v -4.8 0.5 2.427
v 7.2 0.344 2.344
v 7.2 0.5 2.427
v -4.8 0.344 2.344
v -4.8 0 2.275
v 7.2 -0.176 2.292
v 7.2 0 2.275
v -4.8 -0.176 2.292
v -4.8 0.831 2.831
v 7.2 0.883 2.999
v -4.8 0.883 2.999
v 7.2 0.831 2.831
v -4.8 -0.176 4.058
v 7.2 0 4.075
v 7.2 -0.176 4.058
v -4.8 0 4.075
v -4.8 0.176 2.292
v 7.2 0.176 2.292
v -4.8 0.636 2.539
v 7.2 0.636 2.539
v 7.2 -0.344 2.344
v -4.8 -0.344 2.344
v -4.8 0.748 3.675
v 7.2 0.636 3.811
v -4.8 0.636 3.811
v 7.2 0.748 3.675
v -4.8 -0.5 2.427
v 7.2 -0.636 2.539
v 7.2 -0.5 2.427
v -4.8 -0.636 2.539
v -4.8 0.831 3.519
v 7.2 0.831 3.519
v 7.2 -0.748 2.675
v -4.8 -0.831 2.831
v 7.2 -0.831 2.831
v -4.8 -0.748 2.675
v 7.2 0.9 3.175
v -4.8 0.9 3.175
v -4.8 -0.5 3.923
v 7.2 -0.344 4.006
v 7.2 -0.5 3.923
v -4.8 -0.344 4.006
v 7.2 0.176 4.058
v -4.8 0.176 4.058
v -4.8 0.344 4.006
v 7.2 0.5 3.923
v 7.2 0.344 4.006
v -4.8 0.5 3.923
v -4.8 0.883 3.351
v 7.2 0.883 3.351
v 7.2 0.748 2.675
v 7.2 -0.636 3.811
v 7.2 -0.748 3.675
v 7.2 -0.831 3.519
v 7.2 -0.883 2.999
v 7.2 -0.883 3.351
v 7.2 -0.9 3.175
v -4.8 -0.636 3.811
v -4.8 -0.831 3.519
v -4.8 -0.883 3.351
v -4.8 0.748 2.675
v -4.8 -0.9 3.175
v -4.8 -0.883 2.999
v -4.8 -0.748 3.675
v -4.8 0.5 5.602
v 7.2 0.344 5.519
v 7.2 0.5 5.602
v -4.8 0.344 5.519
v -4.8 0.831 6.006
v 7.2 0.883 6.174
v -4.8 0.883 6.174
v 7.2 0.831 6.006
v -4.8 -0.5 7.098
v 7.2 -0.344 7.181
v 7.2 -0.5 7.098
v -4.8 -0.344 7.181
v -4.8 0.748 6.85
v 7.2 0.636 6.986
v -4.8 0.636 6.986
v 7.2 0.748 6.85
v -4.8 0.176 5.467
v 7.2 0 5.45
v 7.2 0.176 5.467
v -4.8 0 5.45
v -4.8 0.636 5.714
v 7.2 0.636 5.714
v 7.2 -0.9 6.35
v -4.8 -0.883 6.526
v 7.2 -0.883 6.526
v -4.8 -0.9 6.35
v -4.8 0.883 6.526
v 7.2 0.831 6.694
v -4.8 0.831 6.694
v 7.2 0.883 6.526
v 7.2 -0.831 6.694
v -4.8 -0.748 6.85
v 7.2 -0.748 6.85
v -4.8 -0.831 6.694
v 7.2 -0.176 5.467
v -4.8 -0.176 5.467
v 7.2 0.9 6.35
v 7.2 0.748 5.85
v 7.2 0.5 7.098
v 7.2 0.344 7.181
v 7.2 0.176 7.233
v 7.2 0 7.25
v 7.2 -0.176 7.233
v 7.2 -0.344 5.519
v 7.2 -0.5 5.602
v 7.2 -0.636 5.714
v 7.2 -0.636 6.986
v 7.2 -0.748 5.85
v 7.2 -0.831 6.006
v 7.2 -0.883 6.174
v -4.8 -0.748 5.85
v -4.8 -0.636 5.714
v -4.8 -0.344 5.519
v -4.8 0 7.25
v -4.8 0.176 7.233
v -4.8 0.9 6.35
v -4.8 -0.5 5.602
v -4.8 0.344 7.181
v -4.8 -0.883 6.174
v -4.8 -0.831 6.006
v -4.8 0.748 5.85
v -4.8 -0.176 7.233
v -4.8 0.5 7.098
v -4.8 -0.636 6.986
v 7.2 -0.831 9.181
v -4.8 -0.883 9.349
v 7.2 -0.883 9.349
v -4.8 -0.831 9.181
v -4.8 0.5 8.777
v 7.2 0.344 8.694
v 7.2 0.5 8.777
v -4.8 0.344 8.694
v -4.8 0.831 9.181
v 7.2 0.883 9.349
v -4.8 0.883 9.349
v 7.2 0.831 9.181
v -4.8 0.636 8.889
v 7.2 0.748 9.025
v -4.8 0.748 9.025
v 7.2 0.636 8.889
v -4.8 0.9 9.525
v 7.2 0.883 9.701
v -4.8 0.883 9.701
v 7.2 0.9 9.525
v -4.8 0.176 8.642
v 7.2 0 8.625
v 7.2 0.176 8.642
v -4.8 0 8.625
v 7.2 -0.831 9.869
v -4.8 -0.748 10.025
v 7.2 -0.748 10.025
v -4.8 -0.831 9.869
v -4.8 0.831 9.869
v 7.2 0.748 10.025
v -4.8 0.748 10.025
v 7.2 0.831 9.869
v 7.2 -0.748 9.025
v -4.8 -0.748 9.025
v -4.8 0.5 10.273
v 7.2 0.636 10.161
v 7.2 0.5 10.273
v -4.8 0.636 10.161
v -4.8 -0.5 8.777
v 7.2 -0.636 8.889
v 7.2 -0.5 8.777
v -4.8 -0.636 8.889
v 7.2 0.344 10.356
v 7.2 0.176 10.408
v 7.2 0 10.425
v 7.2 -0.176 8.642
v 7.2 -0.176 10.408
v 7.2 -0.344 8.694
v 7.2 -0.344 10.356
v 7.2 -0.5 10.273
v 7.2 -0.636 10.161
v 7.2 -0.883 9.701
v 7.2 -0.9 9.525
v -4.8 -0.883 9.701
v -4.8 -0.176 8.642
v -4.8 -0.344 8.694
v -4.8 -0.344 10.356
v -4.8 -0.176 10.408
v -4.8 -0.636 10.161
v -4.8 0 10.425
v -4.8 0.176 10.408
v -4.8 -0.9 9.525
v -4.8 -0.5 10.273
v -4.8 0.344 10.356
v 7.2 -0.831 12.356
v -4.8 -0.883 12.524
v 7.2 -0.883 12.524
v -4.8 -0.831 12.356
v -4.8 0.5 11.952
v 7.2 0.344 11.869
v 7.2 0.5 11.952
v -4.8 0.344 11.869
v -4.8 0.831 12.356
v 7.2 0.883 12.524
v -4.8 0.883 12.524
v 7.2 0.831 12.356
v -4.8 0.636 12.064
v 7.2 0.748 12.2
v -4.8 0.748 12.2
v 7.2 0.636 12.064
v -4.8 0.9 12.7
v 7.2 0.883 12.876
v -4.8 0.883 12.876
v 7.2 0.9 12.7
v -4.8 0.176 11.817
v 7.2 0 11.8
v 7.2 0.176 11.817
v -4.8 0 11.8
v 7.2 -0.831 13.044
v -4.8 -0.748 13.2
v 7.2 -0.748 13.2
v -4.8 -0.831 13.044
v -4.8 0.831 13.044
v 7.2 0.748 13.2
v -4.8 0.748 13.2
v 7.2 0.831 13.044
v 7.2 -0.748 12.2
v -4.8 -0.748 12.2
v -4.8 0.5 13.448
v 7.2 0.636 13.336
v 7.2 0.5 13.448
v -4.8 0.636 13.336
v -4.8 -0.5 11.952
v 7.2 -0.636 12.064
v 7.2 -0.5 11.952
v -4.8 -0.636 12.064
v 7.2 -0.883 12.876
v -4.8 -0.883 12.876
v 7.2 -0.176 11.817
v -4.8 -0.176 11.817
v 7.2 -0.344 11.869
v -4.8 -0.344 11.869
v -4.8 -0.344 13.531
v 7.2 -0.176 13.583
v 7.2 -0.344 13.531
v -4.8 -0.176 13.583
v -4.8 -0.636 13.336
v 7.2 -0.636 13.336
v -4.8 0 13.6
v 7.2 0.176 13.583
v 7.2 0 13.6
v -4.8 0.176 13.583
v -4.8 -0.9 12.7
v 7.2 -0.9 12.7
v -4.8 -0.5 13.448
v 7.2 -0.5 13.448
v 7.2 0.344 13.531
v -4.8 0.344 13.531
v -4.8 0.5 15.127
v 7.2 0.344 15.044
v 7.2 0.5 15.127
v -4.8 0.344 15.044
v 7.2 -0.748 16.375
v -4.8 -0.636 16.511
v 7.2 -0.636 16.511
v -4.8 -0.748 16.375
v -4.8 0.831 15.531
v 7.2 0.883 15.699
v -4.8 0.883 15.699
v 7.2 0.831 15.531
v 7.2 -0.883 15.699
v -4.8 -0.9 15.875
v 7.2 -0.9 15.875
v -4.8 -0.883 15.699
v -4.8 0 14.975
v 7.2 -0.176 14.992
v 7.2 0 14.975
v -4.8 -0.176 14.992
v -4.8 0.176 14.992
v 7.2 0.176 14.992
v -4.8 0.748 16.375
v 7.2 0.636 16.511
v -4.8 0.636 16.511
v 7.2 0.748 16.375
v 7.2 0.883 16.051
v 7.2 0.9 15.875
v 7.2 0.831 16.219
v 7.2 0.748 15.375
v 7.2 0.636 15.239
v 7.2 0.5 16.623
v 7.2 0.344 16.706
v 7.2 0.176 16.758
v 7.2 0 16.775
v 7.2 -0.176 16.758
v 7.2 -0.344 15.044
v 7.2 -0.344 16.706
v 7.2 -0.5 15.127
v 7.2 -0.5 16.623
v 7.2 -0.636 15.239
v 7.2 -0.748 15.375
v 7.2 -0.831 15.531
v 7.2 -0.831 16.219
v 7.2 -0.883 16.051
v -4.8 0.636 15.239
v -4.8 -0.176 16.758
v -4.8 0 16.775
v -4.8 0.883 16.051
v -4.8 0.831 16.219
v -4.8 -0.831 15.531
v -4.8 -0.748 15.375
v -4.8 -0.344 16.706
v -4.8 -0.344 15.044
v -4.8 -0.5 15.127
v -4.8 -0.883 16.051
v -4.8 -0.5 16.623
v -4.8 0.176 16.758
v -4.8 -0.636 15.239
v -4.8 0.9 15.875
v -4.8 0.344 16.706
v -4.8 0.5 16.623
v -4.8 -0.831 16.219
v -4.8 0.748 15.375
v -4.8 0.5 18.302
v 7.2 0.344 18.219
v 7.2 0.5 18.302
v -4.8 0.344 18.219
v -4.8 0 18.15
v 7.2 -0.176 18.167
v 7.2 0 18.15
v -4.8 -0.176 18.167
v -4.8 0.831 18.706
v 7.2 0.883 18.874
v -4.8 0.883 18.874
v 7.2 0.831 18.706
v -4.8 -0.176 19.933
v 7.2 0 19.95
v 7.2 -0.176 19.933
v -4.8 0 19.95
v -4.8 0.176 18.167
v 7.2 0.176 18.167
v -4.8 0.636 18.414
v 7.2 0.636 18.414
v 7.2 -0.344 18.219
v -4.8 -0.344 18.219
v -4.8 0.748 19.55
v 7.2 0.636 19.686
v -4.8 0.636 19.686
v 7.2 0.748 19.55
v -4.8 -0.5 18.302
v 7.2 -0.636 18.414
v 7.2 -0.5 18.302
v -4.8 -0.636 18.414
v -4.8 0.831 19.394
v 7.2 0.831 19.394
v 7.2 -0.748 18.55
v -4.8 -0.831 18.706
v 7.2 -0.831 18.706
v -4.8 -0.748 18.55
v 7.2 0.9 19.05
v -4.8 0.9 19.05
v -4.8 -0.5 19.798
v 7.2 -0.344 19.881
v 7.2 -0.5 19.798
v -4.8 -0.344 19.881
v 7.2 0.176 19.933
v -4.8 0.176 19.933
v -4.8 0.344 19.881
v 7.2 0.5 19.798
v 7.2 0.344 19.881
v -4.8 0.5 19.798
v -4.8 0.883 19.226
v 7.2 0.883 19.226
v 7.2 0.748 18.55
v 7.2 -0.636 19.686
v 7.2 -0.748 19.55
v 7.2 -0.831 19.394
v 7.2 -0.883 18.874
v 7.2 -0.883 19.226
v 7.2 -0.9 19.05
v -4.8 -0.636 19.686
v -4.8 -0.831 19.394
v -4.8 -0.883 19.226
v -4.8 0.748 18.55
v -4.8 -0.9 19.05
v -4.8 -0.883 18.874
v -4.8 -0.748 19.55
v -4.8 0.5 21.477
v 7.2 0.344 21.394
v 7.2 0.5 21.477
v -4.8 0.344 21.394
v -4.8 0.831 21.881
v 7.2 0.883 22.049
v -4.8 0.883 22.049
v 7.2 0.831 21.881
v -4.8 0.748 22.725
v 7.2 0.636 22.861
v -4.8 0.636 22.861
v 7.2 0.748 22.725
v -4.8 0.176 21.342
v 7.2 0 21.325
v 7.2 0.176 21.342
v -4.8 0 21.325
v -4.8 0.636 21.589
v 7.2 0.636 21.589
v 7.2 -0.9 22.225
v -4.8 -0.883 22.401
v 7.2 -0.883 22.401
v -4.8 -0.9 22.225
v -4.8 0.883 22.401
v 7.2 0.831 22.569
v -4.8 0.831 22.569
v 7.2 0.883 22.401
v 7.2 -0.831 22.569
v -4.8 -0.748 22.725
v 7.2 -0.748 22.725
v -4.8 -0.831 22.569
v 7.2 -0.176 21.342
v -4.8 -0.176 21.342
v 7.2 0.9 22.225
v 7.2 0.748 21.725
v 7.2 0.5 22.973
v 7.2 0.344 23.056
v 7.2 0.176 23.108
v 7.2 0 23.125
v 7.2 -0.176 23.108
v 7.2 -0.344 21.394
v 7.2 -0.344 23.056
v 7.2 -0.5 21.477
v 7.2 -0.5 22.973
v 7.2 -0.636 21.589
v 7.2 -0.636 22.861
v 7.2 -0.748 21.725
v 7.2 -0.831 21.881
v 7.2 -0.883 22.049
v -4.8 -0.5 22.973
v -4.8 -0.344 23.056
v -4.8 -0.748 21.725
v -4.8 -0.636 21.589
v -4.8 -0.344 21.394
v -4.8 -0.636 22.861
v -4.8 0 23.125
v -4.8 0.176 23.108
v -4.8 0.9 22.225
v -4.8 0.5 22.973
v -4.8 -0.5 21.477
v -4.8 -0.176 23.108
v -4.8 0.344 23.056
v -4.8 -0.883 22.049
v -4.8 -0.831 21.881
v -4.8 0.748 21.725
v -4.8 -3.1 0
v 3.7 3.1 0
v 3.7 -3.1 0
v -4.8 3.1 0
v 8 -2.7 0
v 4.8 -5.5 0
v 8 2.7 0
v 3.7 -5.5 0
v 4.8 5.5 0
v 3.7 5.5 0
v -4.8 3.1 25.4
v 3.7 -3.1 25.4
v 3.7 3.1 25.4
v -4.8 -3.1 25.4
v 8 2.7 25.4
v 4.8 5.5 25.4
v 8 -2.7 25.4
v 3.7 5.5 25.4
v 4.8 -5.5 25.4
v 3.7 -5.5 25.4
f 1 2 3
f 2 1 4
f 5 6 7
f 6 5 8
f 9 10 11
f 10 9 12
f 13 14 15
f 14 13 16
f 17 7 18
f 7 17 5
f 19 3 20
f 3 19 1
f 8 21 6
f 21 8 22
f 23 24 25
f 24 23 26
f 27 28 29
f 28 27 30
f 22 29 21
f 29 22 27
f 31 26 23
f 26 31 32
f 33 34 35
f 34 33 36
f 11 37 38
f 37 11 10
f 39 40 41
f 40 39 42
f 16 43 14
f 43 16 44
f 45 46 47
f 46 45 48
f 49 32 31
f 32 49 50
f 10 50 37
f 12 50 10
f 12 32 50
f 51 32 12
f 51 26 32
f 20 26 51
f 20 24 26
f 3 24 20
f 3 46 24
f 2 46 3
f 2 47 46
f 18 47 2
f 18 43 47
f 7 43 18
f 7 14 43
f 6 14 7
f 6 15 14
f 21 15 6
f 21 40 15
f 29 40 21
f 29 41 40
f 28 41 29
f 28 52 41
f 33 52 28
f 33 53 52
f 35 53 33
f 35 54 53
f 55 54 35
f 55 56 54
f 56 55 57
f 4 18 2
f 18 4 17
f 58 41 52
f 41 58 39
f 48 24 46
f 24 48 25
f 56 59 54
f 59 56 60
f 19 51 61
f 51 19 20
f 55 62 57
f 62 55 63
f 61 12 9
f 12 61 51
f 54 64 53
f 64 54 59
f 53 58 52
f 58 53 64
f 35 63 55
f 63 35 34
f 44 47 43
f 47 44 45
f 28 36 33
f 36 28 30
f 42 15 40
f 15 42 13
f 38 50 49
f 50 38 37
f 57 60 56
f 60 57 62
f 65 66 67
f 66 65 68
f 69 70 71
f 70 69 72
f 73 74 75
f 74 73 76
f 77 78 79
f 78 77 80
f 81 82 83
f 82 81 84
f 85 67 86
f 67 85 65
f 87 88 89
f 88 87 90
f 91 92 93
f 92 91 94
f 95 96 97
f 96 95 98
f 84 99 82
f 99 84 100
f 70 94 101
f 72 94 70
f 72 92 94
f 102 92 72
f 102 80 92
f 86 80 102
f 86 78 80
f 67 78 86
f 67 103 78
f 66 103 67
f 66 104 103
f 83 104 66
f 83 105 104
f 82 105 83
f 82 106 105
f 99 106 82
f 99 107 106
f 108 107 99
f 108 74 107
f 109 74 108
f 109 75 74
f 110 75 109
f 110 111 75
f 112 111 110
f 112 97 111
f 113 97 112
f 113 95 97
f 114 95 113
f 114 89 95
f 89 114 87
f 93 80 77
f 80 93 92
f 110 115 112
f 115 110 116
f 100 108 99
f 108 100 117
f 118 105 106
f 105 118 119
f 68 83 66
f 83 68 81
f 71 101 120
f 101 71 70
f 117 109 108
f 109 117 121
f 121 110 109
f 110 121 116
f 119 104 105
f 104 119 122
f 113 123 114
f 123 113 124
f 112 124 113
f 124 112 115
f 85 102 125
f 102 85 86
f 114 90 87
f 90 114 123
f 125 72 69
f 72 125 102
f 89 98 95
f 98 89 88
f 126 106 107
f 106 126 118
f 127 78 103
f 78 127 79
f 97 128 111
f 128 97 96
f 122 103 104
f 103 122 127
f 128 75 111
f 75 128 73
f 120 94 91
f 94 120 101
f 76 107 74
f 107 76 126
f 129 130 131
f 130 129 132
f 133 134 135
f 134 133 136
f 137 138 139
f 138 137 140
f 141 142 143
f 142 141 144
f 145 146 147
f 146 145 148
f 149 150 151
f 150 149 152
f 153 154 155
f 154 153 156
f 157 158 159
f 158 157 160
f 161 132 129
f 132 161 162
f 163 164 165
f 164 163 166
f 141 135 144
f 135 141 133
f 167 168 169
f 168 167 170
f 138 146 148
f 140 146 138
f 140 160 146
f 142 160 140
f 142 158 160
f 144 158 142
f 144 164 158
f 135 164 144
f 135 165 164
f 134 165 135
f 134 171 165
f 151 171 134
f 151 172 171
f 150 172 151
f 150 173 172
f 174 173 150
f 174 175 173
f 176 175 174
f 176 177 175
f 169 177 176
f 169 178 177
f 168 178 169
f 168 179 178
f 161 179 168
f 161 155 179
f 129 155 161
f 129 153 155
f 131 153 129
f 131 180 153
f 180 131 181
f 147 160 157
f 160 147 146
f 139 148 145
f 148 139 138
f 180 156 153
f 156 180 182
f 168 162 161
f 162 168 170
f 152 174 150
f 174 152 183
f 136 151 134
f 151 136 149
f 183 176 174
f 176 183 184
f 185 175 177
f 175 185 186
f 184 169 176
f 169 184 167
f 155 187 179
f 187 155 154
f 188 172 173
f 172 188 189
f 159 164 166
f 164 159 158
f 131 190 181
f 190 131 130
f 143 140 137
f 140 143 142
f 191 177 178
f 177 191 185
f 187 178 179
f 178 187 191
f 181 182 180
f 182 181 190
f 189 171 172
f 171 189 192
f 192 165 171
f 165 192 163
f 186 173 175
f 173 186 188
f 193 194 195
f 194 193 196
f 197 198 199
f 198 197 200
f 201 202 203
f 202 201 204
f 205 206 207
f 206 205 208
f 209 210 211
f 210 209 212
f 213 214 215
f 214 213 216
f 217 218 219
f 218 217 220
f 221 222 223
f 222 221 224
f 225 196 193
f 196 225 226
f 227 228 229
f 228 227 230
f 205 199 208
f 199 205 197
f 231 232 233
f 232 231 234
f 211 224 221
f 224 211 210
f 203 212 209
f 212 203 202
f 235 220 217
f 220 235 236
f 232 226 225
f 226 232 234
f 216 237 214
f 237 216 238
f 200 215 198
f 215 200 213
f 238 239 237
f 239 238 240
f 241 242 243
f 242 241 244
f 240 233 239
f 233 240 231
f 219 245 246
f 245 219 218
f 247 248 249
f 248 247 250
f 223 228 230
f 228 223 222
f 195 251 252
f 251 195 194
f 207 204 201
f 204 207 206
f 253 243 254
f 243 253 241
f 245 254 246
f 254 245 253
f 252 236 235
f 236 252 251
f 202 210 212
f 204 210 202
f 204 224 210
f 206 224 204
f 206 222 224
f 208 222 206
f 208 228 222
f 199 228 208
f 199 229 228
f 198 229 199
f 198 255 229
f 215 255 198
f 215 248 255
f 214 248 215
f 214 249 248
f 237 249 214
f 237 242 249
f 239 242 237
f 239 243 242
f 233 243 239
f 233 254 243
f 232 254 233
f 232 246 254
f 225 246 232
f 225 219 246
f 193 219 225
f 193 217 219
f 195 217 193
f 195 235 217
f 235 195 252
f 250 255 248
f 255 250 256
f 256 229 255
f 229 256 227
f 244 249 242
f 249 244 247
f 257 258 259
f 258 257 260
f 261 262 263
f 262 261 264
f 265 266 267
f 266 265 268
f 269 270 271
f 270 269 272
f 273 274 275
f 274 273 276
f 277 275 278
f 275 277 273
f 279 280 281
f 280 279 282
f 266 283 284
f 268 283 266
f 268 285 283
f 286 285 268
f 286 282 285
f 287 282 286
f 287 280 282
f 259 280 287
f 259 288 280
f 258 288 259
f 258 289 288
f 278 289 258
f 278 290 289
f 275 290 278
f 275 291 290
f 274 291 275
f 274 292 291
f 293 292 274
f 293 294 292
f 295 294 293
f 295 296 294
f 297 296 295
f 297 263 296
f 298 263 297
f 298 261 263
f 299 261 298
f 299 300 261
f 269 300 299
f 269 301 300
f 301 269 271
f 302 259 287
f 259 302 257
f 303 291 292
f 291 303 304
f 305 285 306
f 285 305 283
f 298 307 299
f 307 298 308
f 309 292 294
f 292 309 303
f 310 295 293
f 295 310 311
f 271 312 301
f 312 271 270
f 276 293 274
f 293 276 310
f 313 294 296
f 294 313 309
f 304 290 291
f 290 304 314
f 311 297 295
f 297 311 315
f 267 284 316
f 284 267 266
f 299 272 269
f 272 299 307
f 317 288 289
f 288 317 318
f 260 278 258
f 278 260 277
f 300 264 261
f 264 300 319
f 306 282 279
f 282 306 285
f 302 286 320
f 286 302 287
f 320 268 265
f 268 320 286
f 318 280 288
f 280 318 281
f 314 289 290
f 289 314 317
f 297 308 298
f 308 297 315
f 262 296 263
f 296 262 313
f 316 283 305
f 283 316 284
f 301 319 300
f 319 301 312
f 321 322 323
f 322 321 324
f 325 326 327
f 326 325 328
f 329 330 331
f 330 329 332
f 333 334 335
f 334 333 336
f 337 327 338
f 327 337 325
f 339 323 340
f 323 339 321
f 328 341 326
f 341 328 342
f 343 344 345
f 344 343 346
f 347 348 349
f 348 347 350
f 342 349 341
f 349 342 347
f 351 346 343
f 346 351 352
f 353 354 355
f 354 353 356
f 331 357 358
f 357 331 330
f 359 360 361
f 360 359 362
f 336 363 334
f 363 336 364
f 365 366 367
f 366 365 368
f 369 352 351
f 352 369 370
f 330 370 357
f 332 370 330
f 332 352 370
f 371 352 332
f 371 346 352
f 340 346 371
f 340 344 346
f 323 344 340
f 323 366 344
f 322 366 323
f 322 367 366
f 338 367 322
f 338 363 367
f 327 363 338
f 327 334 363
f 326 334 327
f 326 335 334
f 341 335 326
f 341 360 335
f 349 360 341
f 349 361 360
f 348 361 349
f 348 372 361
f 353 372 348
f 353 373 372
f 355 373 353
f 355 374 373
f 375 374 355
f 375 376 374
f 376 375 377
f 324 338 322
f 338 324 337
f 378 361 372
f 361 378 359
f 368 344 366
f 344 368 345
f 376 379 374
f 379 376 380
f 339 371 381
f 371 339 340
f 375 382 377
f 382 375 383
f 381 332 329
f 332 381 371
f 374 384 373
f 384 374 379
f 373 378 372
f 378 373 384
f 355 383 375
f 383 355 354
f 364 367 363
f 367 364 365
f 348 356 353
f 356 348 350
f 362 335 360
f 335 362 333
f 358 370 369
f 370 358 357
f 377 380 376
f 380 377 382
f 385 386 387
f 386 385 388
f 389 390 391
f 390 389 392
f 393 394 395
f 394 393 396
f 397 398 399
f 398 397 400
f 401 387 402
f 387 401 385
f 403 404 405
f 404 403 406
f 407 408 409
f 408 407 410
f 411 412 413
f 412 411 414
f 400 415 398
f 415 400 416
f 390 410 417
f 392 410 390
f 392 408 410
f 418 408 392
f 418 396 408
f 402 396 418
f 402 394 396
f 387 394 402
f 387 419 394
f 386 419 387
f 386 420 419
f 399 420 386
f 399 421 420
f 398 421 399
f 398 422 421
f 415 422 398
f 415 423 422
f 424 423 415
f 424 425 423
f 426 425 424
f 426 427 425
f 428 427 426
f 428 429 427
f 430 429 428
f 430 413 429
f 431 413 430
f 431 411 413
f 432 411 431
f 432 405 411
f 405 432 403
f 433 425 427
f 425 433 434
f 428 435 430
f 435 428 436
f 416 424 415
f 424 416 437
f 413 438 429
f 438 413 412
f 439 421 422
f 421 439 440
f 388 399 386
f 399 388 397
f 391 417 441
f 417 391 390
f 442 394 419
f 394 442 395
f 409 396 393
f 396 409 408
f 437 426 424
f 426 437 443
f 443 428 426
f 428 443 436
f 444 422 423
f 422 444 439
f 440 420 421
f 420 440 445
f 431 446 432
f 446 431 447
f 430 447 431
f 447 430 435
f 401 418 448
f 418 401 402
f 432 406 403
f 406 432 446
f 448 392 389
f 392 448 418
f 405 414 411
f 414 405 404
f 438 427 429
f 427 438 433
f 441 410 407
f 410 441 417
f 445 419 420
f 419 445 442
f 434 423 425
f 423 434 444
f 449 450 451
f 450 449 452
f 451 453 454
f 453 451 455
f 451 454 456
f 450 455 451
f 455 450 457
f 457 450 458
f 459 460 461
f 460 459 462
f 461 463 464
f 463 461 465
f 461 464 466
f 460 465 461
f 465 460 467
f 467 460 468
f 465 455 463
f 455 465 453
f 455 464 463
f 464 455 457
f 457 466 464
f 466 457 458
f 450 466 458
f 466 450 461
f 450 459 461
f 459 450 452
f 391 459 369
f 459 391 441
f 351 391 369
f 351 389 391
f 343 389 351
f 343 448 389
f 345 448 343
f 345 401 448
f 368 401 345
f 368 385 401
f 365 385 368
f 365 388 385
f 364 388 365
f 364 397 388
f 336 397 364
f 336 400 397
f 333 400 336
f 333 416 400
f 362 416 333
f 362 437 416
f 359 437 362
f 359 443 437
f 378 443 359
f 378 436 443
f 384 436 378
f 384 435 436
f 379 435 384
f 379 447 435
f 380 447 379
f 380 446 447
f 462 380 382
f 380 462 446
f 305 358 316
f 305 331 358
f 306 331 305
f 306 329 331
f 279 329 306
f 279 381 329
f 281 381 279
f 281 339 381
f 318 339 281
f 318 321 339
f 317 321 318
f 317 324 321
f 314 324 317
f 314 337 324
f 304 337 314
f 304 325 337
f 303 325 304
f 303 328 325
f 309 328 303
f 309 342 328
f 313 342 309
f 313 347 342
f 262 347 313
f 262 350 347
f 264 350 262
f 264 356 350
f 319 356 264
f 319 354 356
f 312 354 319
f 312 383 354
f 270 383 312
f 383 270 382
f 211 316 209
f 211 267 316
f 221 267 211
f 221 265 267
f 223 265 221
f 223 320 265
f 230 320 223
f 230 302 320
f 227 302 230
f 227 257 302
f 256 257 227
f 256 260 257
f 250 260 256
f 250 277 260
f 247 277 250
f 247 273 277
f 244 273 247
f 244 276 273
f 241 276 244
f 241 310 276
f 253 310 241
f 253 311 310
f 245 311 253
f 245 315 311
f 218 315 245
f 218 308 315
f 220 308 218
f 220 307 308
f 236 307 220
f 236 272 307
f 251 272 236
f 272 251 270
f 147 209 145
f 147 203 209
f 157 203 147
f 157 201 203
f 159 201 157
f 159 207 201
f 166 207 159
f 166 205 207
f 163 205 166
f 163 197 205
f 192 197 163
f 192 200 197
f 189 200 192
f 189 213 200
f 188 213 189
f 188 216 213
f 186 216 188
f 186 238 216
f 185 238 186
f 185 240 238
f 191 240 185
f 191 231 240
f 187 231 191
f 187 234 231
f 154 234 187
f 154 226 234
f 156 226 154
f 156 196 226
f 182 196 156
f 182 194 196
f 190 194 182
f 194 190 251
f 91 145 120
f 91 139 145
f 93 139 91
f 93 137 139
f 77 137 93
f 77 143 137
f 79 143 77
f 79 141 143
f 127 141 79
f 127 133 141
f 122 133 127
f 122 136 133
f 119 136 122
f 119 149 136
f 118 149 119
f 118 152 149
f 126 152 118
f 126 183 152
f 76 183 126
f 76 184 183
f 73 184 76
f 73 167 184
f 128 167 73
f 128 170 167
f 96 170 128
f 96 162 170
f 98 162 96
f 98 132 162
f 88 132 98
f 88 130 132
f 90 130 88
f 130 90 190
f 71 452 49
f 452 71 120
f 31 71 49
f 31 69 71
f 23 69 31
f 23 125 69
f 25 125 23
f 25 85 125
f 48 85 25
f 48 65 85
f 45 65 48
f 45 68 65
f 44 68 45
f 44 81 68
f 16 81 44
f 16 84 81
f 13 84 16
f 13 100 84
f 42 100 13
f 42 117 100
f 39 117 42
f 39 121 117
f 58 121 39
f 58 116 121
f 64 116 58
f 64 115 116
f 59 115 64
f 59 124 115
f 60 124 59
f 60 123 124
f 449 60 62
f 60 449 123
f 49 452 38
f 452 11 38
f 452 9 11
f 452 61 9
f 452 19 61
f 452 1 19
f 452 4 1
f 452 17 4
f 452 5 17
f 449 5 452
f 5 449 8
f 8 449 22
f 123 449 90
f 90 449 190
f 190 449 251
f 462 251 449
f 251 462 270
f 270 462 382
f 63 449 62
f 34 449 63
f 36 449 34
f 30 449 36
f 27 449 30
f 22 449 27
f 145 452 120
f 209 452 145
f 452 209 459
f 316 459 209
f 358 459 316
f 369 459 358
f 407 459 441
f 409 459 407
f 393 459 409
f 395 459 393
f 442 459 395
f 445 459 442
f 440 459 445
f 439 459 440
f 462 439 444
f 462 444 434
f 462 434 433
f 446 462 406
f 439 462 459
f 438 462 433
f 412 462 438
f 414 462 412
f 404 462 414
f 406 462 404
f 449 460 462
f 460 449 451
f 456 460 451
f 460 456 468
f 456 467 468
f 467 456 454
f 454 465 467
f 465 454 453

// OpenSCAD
// file: ../profiles/transition_2040.scad
// EU2040 printable transition between real 20 x 40 mm aluminum sections.
// All six single-key slots are open along the full axial length.
// Each slot has an entry/exit lead-in at BOTH axial faces.
// Millimeters. Experimental geometry, not a dimensional certification.
// License: see ../LICENSE.

// Derived from the *embedded portion* of key_2040_003.
// Do not include its 4.8 mm exposed extension or its screw holes.
module _eu2040_keyway_2d() {
    polygon(points=[
        [-2.0, -3.1],
        [3.7, -3.1],
        [3.7, -5.5],
        [4.8, -5.5],
        [8.0, -2.7],
        [8.0,  2.7],
        [4.8,  5.5],
        [3.7,  5.5],
        [3.7,  3.1],
        [-2.0, 3.1]
    ]);
}

// 20 x 40 envelope, six slots:
// one on each 20 mm end, two on each 40 mm side.
module _eu2040_six_keyways_2d() {
    translate([0, -20])
        rotate(90) _eu2040_keyway_2d();
    translate([0, 20])
        rotate(-90) _eu2040_keyway_2d();

    for (side_y=[-10, 10]) {
        translate([-10, side_y])
            _eu2040_keyway_2d();
        translate([10, side_y])
            rotate(180) _eu2040_keyway_2d();
    }
}

// A local axial chamfer cut: enlarged slot opening at the end face,
// merging into the exact nominal keyway after lead_in mm.
module _eu2040_slot_lead_in(lead_in, flare) {
    hull() {
        linear_extrude(height=0.01)
            offset(delta=flare)
                _eu2040_six_keyways_2d();
        translate([0,0,lead_in])
            linear_extrude(height=0.01)
                _eu2040_six_keyways_2d();
    }
}

// Full-size outer outline; no approximation of aluminum internal webs.
// Two-sided axial bevels apply to all six keyways.
// Fixed lead-in geometry is recorded as version 001, not global tolerance.
module transition_2040_001(cut_len) {
    assert(!is_undef(cut_len) && is_num(cut_len) && cut_len > 0,
        "transition_2040_001: cut_len must be a positive number");

    lead_in = 0.8;
    flare = 0.4;

    assert(cut_len > 2*lead_in,
        "transition_2040_001: cut_len too short for two lead-ins");

    difference() {
        linear_extrude(height=cut_len)
            square([20,40], center=true);

        // Continuous six-slot paths.
        translate([0,0,-0.02])
            linear_extrude(height=cut_len+0.04)
                _eu2040_six_keyways_2d();

        // Lead-in at z=0.
        translate([0,0,-0.01])
            _eu2040_slot_lead_in(lead_in, flare);

        // Matching lead-in at z=cut_len.
        translate([0,0,cut_len+0.01])
            mirror([0,0,1])
                _eu2040_slot_lead_in(lead_in, flare);
    }
}
// file: ../keys/sliding.scad
// EU2040 single-slot sliding key.
// Units: mm. Experimental geometry from an iterative physical fit test.
// Print process calibration and strength qualification are NOT included.
// BSD 2-Clause License; see ../LICENSE.

// Experimental geometry snapshot with a raised 0.6 mm retaining shoulder.
// Seven blind transverse pilot holes, evenly spaced along cutLen.
// X points into the extrusion; Z is the length of the key.
// A subsequent validated change should be introduced under a new identifier.
module key_2040_003(cut_len) {
    extension = 4.8;
    hole_diameter = 1.8;
    hole_depth = 12.0;
    hole_count = 7;
    wedge_adjust = 0.5;
    shoulder_raise = 0.6;
    shoulder_x = 4.3 - shoulder_raise;

    assert(!is_undef(cut_len) && is_num(cut_len) && cut_len > 0,
        "key_2040_003: cut_len must be a positive number");

    difference() {
        linear_extrude(height=cut_len)
            polygon(points=[
                [-extension, -3.1],
                [shoulder_x, -3.1],
                [shoulder_x, -5.5],
                [4.8, -5.5],
                [8.0, -2.2-wedge_adjust],
                [8.0,  2.2+wedge_adjust],
                [4.8,  5.5],
                [shoulder_x, 5.5],
                [shoulder_x, 3.1],
                [-extension, 3.1]
            ]);

        for (i = [1:hole_count]) {
            translate([
                -extension,
                0,
                cut_len * i / (hole_count+1)
            ])
                rotate([0,90,0])
                    cylinder(h=hole_depth, d=hole_diameter, $fn=32);
        }
    }
}

// Compatibility entry point for the original prototype's call signature.
module key2040(cutLen) {
    key_2040_003(cut_len=cutLen);
}
// file: ../EU2040.scad
// EU2040 public library entry point.
// Library definitions only; no geometry is rendered automatically.
// License: see LICENSE.
include <keys/sliding.scad>;
include <profiles/transition_2040.scad>;
// main file
// Standalone sample: short print for physical slot-fit checking.
// No printer-specific fit correction is applied.
include <../EU2040.scad>;
key2040(cutLen=25.4);
